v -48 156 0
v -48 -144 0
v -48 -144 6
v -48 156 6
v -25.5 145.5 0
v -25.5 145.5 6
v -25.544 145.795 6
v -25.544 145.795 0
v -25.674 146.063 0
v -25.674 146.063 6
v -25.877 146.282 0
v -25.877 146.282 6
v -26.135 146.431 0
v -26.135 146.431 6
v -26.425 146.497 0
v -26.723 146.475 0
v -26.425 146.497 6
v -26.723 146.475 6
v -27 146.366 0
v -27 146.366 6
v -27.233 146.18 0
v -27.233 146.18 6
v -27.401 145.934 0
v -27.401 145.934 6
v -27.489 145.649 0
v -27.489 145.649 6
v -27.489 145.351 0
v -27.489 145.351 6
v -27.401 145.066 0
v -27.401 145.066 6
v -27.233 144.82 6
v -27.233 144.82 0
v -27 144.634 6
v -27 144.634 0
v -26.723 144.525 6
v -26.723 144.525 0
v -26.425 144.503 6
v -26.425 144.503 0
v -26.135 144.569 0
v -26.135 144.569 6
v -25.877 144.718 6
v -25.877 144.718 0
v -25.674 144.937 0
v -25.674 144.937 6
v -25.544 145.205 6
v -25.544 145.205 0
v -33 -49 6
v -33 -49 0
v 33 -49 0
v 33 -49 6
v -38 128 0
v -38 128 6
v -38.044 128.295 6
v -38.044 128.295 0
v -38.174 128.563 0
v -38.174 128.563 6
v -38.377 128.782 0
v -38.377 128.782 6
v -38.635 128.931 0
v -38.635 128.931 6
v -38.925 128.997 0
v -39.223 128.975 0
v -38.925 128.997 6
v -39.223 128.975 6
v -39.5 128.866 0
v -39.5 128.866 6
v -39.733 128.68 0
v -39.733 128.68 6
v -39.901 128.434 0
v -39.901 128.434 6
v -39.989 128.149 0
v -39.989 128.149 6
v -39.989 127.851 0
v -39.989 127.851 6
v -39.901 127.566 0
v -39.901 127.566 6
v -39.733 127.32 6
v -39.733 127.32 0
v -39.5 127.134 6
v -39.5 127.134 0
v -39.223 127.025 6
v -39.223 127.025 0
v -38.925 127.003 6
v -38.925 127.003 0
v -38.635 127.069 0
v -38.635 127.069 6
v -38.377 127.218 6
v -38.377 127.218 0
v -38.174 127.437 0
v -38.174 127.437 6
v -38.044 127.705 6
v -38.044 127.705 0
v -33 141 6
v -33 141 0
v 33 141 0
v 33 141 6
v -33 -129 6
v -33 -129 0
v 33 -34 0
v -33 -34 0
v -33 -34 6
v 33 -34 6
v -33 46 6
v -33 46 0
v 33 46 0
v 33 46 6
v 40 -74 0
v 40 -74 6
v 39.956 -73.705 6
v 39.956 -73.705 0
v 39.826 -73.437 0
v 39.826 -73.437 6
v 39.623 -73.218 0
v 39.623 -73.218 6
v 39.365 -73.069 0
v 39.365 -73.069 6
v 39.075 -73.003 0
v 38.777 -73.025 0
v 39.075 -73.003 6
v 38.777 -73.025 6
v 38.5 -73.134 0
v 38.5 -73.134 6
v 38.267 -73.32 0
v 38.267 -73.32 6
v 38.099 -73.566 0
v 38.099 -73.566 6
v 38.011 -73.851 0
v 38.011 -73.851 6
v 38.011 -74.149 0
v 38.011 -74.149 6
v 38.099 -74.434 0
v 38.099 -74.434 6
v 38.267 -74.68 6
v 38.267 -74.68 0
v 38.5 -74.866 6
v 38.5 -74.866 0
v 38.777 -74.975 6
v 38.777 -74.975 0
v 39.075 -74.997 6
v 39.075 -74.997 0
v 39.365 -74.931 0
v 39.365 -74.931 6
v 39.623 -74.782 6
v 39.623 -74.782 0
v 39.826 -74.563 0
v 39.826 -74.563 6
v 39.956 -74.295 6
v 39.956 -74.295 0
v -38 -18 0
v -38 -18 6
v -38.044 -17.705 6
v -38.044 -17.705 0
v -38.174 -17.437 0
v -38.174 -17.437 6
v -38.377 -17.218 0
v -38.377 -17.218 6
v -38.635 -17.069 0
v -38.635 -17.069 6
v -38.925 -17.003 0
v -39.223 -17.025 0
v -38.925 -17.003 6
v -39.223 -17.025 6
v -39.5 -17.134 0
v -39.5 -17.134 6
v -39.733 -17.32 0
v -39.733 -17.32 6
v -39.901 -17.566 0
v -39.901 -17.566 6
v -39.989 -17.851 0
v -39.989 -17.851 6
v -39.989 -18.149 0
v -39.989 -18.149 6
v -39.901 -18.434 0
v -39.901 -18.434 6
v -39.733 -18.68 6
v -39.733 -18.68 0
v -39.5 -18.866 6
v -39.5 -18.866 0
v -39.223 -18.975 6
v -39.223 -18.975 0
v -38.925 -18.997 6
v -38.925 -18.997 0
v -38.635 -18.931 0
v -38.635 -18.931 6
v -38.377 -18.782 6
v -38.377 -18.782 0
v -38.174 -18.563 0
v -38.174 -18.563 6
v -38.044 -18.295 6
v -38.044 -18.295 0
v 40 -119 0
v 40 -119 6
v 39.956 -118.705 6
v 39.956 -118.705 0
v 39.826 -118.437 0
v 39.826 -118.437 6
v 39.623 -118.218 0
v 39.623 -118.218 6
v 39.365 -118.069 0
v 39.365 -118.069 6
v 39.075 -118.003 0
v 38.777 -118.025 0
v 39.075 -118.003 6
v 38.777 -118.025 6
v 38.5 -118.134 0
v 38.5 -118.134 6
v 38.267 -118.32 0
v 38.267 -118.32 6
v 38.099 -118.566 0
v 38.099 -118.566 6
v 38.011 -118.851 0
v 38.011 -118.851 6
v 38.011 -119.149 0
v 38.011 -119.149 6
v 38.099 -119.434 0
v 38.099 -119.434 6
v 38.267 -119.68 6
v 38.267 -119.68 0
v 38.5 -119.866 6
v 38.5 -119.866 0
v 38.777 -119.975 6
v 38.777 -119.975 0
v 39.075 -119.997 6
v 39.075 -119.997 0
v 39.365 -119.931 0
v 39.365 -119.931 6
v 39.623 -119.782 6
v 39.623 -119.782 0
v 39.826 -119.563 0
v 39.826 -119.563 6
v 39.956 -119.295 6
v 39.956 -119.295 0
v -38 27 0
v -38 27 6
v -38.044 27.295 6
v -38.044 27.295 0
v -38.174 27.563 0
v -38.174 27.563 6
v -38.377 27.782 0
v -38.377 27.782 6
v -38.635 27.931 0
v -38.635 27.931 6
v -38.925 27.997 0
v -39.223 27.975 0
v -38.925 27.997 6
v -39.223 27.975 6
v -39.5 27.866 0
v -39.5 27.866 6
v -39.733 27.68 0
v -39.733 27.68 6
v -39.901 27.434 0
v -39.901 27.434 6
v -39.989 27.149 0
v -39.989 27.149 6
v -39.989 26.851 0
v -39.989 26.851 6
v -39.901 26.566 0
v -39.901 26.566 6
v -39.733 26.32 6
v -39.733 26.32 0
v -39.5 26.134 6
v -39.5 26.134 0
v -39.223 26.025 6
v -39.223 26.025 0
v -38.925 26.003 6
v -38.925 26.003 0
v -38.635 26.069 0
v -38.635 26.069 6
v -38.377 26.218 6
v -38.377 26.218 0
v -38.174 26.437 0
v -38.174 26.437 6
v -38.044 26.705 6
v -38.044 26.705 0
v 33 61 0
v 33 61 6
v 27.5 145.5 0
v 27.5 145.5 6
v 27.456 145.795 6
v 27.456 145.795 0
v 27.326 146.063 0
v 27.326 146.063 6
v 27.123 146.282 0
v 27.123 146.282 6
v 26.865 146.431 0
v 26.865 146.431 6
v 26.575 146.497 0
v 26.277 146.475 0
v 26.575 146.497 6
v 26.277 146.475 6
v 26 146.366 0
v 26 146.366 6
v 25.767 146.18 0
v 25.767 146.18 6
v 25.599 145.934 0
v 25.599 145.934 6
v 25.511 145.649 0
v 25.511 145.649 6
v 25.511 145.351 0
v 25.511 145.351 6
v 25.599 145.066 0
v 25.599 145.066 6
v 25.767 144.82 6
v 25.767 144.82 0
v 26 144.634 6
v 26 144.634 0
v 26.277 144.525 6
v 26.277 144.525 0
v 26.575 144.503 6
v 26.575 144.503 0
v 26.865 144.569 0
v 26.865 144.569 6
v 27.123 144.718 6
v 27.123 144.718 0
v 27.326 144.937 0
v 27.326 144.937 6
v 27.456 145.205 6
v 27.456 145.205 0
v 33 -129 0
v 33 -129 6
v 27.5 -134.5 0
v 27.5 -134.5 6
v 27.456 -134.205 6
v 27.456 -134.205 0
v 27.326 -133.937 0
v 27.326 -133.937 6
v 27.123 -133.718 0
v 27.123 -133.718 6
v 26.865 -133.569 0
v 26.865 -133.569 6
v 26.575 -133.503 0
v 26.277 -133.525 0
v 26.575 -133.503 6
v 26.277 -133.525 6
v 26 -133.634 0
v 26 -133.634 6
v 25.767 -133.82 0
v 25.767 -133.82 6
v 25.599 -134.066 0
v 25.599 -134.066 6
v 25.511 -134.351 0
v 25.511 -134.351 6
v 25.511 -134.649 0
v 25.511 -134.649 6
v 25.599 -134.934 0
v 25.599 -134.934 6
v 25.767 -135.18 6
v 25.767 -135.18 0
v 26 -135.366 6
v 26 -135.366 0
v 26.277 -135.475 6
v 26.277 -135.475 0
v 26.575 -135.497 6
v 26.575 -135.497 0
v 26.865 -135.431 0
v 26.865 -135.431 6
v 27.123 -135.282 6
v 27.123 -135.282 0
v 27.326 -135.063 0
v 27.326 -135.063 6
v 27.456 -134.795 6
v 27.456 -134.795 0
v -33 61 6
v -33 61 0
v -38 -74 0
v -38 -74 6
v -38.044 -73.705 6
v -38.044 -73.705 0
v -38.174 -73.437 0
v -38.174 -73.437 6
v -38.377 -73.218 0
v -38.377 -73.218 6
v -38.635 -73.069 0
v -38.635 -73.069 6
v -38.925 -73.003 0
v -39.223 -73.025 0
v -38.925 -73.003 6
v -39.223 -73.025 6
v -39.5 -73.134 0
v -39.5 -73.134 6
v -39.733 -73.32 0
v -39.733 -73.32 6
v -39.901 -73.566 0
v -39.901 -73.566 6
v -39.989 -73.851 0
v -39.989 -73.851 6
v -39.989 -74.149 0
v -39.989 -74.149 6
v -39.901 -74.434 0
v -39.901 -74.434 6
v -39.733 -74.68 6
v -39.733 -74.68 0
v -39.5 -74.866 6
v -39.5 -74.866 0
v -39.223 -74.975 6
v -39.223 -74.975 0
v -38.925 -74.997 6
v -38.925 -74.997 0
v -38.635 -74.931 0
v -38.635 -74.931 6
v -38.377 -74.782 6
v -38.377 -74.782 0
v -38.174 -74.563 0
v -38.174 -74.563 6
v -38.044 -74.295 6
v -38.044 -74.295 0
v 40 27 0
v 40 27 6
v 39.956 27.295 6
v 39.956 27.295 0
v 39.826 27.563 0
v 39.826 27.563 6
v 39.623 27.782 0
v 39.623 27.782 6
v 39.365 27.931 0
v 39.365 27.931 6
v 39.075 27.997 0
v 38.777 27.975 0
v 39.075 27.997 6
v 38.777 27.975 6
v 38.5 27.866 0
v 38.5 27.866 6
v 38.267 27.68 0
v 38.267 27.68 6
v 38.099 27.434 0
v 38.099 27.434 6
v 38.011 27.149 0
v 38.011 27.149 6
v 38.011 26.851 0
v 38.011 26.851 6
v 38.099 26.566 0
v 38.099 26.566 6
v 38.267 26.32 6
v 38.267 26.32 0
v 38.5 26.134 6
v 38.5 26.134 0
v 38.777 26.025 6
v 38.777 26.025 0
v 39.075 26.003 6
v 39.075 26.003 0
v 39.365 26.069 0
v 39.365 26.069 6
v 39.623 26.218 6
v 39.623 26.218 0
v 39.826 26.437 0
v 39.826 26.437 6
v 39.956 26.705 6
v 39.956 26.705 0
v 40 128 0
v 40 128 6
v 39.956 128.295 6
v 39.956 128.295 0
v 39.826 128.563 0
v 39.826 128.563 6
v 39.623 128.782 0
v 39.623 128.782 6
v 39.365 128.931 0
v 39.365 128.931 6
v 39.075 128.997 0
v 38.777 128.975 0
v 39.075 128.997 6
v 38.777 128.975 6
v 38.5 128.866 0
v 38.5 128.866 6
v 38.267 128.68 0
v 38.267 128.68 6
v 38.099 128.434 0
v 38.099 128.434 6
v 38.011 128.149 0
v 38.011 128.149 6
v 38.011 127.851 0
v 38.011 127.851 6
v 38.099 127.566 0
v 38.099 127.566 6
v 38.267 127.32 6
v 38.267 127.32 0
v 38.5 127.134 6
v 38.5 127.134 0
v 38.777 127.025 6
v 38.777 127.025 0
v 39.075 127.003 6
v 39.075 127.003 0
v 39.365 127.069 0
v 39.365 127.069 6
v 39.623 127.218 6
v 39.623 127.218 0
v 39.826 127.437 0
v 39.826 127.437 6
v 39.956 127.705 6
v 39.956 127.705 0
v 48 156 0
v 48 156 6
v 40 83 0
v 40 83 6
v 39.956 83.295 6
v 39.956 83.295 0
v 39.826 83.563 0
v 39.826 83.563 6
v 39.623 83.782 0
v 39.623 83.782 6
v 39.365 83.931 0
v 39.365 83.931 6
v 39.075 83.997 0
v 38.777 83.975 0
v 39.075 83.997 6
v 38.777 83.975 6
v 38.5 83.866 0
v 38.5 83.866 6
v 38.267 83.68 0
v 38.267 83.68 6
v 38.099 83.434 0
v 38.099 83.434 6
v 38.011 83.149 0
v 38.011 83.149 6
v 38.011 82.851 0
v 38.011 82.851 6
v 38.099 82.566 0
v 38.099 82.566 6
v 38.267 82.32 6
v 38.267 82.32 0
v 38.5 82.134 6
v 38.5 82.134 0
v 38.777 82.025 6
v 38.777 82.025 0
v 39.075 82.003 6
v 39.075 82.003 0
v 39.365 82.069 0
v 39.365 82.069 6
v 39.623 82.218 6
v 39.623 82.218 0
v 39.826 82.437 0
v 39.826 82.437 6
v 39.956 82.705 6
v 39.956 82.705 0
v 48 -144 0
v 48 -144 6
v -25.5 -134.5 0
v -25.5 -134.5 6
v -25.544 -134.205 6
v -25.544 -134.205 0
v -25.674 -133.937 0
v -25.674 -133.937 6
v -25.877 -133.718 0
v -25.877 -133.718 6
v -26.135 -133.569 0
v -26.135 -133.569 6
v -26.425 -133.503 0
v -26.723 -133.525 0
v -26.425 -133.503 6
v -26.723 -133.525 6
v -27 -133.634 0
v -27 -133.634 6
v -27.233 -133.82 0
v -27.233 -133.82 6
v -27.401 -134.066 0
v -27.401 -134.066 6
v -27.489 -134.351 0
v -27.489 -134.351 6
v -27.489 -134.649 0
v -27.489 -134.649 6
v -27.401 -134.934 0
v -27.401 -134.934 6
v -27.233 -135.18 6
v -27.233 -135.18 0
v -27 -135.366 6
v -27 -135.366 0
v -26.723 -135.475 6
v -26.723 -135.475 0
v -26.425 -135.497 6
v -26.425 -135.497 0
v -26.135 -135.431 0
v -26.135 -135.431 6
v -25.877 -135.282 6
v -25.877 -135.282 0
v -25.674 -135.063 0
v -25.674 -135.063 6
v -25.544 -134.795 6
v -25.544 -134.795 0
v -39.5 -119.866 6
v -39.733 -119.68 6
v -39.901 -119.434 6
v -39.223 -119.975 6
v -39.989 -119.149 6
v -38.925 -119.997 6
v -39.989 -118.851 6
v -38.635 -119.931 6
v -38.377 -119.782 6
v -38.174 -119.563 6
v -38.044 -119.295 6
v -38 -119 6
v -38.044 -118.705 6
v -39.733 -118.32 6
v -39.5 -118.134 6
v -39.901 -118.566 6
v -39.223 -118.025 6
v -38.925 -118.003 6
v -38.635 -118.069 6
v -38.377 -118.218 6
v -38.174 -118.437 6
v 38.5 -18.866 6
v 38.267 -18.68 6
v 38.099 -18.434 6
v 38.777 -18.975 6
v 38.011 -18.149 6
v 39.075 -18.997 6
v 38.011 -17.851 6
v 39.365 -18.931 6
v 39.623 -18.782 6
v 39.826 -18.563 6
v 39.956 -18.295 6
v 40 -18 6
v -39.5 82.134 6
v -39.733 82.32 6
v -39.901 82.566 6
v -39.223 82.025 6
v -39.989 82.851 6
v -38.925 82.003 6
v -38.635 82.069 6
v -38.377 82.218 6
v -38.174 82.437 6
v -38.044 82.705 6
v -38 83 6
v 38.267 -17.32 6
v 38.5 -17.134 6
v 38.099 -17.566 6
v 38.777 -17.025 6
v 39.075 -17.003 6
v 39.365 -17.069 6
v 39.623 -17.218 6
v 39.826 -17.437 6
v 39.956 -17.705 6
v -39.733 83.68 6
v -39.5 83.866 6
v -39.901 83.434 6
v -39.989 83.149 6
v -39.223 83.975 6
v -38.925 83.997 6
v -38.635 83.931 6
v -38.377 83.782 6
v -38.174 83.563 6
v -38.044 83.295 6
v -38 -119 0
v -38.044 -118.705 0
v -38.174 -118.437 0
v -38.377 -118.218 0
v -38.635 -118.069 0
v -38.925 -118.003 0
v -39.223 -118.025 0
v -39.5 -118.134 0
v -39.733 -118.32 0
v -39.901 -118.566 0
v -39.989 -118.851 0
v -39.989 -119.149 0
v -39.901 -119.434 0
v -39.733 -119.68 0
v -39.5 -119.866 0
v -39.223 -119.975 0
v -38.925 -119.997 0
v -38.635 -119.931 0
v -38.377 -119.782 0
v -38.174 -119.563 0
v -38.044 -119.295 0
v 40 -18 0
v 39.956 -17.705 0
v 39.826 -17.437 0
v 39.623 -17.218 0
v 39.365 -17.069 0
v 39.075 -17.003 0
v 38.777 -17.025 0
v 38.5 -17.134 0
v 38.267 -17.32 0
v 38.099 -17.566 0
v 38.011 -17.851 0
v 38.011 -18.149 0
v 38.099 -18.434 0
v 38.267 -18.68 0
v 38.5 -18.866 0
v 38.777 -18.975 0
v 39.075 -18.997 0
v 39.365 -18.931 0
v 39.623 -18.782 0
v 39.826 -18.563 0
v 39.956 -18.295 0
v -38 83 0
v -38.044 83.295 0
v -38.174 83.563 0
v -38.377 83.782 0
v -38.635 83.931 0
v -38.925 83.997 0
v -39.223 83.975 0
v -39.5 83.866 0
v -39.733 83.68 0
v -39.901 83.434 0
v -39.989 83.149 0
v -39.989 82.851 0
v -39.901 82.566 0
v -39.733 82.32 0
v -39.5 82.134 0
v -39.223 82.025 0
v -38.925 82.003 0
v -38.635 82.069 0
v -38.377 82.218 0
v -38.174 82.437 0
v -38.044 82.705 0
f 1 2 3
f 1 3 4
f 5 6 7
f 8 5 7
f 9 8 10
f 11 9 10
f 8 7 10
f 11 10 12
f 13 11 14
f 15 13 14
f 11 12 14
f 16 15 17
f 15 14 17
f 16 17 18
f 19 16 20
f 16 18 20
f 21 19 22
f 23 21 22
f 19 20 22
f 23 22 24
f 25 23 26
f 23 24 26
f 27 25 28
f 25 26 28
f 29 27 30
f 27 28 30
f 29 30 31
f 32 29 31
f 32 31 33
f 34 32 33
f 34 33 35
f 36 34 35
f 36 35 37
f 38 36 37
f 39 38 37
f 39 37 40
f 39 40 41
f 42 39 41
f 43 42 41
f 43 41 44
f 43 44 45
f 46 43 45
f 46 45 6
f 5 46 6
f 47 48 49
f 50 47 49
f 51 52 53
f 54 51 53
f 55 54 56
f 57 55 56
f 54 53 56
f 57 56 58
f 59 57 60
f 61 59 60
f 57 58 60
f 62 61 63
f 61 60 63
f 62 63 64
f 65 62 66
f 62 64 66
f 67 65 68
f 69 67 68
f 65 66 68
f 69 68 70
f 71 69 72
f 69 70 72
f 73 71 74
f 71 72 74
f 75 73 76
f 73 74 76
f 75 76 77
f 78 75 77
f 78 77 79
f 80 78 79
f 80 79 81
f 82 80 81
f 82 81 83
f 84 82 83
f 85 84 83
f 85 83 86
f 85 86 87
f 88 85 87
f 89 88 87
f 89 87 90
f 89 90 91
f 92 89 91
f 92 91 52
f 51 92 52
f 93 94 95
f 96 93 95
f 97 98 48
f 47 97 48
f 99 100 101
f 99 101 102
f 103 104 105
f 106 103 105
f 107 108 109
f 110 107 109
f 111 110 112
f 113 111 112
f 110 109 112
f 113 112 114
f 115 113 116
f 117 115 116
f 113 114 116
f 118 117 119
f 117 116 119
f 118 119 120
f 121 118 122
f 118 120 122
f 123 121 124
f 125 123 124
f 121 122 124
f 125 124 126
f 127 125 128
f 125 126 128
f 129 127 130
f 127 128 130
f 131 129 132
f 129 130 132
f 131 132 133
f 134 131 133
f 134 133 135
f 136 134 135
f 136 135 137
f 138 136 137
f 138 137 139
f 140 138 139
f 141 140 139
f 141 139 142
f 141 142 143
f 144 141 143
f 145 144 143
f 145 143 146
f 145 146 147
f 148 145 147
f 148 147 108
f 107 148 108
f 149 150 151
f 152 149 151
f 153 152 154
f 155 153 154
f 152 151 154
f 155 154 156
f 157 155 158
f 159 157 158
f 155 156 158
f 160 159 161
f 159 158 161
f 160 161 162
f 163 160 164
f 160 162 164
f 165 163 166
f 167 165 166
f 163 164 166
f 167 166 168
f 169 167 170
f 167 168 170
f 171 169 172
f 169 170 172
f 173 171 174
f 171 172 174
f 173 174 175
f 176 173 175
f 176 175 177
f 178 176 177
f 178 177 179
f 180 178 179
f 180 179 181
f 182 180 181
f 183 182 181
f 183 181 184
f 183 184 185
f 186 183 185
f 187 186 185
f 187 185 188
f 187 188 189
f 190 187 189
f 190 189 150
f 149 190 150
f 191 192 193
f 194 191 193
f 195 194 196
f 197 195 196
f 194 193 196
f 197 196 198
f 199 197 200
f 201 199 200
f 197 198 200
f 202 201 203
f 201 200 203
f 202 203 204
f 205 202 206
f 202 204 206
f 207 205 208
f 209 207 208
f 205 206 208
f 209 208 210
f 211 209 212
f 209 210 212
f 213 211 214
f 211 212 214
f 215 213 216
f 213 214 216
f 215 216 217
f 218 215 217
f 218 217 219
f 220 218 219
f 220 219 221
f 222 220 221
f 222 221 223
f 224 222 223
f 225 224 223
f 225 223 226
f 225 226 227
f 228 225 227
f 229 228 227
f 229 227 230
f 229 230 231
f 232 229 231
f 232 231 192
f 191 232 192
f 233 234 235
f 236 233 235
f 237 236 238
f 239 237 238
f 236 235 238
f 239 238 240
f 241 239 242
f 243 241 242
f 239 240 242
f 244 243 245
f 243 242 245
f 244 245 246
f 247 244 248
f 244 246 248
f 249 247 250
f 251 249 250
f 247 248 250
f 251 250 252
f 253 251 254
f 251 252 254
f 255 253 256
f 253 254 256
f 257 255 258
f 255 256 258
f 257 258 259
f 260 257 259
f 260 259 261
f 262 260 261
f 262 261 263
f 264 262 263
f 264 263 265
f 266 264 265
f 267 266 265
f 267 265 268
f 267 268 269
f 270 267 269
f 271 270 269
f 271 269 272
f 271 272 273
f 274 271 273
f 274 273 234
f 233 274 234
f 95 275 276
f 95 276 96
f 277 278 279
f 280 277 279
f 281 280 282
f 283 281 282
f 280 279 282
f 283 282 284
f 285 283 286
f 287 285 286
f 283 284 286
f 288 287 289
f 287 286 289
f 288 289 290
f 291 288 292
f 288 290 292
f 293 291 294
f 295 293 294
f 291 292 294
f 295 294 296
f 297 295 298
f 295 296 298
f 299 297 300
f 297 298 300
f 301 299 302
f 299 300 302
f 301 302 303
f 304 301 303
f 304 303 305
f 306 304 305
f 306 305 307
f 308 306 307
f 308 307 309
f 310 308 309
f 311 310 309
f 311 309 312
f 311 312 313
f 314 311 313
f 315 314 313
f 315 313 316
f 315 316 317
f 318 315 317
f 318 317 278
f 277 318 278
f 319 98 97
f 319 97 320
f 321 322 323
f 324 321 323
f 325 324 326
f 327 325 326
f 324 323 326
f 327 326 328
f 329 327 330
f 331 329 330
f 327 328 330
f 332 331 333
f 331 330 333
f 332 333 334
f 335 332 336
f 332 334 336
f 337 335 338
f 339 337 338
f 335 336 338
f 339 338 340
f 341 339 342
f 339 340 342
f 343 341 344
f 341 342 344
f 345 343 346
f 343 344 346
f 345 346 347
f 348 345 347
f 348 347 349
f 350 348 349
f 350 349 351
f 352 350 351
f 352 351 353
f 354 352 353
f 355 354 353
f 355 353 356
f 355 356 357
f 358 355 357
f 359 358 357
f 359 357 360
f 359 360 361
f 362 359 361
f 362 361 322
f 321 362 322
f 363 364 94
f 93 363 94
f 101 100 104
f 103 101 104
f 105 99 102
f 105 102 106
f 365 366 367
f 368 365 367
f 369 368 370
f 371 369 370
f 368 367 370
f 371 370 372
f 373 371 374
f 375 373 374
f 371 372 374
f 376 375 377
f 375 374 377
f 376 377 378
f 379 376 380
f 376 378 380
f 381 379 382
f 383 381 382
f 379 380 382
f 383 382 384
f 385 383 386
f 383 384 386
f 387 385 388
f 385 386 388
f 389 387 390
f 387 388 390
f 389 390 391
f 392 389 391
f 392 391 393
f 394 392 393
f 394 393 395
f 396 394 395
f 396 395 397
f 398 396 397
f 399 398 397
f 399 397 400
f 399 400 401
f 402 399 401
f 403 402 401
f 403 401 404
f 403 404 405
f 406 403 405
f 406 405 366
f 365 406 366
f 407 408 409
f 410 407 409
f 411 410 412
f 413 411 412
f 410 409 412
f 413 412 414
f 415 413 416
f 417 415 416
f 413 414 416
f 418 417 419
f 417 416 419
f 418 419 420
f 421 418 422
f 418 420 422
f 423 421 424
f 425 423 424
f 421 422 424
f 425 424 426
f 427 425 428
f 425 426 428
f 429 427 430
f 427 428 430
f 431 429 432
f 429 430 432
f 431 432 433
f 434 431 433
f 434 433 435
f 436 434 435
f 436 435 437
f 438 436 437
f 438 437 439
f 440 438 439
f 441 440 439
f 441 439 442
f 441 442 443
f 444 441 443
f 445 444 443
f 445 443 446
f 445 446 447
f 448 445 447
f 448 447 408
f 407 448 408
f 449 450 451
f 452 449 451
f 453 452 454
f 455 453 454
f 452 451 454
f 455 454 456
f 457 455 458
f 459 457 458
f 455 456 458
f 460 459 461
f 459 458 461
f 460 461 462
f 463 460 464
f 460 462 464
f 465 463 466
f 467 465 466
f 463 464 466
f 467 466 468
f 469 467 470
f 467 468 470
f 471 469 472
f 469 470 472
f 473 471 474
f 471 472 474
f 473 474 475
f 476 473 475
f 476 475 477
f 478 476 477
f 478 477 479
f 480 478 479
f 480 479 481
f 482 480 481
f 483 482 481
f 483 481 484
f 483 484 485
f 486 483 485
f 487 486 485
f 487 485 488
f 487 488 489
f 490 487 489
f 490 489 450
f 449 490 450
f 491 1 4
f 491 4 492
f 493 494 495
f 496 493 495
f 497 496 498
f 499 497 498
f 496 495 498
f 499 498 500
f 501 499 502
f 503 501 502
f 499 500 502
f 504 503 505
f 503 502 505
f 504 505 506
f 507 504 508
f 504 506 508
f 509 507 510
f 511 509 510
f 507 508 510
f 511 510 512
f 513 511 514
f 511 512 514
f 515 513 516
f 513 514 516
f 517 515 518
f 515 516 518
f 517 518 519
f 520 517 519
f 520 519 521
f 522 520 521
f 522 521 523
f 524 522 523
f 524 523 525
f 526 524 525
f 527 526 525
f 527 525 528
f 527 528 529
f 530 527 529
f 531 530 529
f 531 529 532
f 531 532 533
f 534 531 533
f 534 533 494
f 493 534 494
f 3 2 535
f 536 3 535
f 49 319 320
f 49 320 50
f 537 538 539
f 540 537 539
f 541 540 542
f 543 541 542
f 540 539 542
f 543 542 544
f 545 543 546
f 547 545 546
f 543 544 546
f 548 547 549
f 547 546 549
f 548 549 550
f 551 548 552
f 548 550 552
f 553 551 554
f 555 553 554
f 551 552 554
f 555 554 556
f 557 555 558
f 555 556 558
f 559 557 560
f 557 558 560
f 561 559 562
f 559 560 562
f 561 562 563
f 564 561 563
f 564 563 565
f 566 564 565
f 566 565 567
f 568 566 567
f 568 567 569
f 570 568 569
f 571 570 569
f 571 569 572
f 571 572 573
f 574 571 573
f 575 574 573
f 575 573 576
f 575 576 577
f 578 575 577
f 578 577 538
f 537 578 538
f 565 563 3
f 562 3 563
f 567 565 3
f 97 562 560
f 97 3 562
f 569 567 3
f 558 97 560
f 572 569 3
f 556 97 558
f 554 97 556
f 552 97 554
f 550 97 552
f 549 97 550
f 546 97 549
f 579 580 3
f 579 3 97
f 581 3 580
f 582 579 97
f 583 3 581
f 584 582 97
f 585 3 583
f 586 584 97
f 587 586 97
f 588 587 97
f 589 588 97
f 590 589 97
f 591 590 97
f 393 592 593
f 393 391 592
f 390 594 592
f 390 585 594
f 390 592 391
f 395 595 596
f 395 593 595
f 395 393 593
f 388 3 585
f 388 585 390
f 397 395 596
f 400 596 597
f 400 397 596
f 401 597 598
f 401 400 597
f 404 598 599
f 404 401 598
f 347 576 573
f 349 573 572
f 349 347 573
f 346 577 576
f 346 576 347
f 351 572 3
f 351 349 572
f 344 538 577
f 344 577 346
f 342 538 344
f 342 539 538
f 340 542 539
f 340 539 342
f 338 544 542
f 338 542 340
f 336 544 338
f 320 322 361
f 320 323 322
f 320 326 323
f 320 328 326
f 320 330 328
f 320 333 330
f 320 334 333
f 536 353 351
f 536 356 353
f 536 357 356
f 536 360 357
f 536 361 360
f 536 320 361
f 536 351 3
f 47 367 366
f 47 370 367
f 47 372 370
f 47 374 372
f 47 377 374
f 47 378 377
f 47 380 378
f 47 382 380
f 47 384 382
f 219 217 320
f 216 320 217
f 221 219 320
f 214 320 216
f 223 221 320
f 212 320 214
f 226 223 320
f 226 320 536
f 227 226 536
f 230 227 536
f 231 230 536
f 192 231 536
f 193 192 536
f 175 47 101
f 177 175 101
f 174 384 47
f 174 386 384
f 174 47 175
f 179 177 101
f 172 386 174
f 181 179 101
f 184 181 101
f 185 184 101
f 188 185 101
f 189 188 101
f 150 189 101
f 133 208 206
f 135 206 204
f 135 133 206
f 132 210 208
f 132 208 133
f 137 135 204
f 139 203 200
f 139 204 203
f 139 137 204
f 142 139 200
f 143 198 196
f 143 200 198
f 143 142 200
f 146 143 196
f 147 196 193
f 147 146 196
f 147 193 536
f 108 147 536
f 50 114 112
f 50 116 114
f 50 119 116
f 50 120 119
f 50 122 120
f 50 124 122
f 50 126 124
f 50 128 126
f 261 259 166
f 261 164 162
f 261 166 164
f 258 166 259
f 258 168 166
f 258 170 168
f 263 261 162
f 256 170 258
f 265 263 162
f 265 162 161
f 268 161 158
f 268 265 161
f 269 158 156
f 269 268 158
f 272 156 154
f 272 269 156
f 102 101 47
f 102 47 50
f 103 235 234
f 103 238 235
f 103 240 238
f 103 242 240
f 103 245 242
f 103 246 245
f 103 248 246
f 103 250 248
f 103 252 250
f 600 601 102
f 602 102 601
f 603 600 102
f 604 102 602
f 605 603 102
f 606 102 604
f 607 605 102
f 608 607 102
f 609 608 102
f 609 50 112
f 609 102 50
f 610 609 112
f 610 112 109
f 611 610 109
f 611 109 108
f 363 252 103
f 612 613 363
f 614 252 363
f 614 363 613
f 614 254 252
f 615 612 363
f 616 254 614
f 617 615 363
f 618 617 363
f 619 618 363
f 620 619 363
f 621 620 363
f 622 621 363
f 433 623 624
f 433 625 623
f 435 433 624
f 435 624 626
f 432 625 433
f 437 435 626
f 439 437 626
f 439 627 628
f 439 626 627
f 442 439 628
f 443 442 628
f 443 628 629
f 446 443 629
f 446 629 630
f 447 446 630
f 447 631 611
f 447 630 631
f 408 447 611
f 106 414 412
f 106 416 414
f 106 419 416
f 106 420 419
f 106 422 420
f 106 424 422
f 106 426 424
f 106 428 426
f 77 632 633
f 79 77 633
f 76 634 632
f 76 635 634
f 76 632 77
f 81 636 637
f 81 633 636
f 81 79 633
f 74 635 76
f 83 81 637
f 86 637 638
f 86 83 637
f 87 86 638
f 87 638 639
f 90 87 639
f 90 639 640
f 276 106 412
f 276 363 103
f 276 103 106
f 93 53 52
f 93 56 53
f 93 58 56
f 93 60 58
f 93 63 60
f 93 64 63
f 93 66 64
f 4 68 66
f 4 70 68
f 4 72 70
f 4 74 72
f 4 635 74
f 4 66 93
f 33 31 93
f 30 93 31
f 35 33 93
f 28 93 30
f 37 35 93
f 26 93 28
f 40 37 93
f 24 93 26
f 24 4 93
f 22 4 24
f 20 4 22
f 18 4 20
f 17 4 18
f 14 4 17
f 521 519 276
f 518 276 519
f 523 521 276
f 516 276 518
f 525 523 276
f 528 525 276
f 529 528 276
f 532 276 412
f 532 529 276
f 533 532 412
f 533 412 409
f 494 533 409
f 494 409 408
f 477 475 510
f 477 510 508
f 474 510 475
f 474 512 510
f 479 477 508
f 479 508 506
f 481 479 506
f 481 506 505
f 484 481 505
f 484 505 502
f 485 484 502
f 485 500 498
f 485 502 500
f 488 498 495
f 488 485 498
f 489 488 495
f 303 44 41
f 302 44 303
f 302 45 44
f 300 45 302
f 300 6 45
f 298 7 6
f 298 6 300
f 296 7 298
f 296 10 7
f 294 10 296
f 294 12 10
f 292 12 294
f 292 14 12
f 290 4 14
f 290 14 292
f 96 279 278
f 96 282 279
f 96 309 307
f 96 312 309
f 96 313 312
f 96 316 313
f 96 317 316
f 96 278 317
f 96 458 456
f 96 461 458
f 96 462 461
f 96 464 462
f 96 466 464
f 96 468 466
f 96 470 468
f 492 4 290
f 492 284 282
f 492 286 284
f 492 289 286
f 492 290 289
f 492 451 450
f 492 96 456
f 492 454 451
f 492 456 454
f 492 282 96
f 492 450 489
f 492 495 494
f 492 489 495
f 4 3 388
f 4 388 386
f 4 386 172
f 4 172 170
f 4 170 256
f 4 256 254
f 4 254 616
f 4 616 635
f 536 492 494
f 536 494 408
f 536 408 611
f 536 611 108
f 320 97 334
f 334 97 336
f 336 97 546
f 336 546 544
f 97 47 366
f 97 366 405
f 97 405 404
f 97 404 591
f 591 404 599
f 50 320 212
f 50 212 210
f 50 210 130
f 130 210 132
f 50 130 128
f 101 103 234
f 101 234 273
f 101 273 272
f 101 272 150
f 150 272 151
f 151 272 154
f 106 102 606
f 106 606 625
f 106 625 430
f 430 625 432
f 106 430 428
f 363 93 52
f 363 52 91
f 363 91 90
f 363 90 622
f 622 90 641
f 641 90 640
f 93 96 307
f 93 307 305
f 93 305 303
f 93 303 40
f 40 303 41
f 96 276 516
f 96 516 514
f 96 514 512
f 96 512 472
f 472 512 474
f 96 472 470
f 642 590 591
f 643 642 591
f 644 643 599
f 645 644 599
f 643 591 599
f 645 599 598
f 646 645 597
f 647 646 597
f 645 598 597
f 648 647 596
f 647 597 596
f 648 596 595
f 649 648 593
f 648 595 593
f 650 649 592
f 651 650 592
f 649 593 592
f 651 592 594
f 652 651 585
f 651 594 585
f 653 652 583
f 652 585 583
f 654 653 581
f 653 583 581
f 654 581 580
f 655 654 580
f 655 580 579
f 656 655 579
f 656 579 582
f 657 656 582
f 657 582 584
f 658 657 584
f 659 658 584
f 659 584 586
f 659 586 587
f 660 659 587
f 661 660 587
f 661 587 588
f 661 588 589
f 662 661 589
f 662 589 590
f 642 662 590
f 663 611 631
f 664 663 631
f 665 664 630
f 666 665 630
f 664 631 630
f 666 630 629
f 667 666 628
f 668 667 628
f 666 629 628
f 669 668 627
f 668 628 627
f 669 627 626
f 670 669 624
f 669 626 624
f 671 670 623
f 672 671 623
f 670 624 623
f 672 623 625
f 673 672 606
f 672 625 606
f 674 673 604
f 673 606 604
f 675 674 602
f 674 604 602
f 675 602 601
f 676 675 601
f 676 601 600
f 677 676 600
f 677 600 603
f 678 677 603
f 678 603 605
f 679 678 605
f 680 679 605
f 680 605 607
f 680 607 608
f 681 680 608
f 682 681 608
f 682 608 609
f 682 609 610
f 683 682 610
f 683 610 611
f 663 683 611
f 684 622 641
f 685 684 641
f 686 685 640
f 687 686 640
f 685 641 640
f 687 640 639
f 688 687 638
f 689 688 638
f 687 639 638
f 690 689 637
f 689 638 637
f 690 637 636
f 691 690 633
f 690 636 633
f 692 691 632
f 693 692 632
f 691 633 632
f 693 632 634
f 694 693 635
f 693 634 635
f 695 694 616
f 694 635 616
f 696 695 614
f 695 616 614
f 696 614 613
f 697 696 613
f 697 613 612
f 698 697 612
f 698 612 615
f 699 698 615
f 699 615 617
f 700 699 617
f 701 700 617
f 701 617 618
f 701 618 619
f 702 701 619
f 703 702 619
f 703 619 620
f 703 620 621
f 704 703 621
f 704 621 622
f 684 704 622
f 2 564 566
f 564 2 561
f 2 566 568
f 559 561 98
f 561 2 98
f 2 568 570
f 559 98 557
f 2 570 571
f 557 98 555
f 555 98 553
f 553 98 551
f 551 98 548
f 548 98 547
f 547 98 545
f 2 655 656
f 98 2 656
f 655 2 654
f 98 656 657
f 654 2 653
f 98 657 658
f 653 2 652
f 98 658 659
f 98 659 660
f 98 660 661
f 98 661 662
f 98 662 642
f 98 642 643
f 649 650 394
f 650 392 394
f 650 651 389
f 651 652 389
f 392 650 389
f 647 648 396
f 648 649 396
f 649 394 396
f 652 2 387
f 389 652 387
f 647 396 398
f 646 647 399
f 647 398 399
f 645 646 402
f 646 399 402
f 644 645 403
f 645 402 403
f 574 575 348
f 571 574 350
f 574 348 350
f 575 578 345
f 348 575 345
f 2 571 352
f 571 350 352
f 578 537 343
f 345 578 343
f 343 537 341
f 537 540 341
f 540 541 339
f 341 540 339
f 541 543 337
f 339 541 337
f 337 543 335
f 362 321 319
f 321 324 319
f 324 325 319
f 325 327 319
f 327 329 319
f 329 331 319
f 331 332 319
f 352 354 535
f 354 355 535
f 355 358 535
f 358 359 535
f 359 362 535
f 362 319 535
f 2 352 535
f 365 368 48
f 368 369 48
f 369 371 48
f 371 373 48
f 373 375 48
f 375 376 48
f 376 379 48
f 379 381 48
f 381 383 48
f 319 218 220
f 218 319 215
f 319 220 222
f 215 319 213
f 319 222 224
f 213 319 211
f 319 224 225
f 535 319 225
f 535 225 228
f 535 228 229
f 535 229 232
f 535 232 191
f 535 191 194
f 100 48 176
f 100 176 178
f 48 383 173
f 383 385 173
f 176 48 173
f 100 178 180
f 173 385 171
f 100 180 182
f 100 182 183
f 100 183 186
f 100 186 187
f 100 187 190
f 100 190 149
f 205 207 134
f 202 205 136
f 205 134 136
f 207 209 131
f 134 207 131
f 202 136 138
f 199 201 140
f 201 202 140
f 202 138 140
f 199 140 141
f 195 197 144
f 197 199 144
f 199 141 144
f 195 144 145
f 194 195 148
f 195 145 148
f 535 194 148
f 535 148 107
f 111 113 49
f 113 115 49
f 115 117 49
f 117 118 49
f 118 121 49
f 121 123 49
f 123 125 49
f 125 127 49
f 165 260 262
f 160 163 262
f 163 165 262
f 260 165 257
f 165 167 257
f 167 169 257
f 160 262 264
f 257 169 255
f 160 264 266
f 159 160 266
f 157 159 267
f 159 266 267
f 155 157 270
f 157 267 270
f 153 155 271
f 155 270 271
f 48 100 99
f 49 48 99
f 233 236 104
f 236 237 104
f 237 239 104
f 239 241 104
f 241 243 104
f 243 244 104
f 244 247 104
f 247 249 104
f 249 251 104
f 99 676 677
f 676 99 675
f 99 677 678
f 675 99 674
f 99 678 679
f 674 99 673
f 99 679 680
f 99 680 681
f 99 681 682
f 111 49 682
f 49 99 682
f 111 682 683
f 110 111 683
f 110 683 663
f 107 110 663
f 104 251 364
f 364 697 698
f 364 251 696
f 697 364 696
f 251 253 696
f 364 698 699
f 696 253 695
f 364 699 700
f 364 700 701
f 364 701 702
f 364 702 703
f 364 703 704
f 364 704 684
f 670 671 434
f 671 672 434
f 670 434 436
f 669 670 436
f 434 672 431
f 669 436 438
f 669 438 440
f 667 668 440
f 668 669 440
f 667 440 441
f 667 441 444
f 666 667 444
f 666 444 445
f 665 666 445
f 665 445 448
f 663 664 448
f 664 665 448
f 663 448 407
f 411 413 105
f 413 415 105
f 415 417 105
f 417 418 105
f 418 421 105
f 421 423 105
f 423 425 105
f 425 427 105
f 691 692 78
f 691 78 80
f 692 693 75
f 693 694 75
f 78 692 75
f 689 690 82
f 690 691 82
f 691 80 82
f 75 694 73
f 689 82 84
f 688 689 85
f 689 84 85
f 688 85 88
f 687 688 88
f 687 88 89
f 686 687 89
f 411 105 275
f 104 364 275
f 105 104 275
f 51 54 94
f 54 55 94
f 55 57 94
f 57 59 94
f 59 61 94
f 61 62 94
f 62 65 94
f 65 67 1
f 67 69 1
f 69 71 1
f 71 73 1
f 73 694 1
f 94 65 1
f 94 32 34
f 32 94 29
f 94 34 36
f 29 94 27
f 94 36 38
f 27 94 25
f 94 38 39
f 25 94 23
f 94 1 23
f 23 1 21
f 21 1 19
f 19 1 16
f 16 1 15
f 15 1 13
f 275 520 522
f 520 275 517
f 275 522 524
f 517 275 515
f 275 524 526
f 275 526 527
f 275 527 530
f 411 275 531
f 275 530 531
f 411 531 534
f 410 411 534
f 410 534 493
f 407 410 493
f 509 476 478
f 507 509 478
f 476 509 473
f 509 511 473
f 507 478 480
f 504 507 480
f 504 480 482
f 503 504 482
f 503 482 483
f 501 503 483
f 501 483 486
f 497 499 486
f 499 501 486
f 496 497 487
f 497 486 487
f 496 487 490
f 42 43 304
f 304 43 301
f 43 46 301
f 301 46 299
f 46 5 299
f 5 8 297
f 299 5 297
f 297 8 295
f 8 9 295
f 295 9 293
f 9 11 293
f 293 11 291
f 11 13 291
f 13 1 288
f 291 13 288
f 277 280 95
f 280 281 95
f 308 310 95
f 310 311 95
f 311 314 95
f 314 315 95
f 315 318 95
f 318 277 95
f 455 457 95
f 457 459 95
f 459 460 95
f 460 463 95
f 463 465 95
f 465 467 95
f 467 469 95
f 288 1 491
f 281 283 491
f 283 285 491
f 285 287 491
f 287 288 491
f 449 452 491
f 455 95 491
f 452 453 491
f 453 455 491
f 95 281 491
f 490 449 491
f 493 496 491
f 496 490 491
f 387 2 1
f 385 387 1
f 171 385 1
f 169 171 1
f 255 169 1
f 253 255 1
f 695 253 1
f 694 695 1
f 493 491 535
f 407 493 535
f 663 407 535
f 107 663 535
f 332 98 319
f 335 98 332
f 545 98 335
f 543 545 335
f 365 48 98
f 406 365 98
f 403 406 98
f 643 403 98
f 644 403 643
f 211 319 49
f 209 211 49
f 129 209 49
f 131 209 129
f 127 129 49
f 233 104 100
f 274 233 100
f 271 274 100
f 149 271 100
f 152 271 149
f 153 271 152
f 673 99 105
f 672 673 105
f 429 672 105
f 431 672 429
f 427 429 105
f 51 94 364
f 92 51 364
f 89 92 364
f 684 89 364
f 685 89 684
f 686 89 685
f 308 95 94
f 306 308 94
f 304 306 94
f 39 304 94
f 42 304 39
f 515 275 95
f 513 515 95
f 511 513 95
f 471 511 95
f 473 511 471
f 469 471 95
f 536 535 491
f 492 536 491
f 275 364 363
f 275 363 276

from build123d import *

# Parameters (mm, degrees)
SKETCH1_W           = 96
SKETCH1_H           = 300
SKETCH1_W_2         = 66
SKETCH1_H_2         = 80
BOSS_EXTRUDE1_DEPTH = 6
SKETCH3_R           = 1
CUT_EXTRUDE6_DEPTH  = 10
SKETCH5_R           = 1
CUT_EXTRUDE9_DEPTH  = 10


with BuildPart() as part:
    # Sketch1 → Boss-Extrude1 (new body)
    with BuildSketch(Plane.XY):
        with Locations((0, 6)):
            Rectangle(SKETCH1_W, SKETCH1_H)
        with Locations((0, 101)):
            Rectangle(SKETCH1_W_2, SKETCH1_H_2, mode=Mode.SUBTRACT)
        with Locations((0, -89)):
            Rectangle(SKETCH1_W_2, SKETCH1_H_2, mode=Mode.SUBTRACT)
        with Locations((0, 6)):
            Rectangle(SKETCH1_W_2, SKETCH1_H_2, mode=Mode.SUBTRACT)
    extrude(amount=BOSS_EXTRUDE1_DEPTH)

    # Sketch3 → Cut-Extrude6 (cut)
    with BuildSketch(Plane.XY.offset(6)):
        with Locations((-39, 128)):
            Circle(SKETCH3_R)
        with Locations((-39, 27)):
            Circle(SKETCH3_R)
        with Locations((39, 128)):
            Circle(SKETCH3_R)
        with Locations((39, 83)):
            Circle(SKETCH3_R)
        with Locations((-39, 83)):
            Circle(SKETCH3_R)
        with Locations((39, 27)):
            Circle(SKETCH3_R)
        with Locations((39, -18)):
            Circle(SKETCH3_R)
        with Locations((-39, -18)):
            Circle(SKETCH3_R)
        with Locations((-39, -74)):
            Circle(SKETCH3_R)
        with Locations((39, -74)):
            Circle(SKETCH3_R)
        with Locations((39, -119)):
            Circle(SKETCH3_R)
        with Locations((-39, -119)):
            Circle(SKETCH3_R)
    extrude(amount=-CUT_EXTRUDE6_DEPTH, mode=Mode.SUBTRACT)

    # Sketch5 → Cut-Extrude9 (cut)
    with BuildSketch(Plane.XY.offset(6)):
        with Locations((-26.5, -134.5)):
            Circle(SKETCH5_R)
        with Locations((26.5, -134.5)):
            Circle(SKETCH5_R)
        with Locations((-26.5, 145.5)):
            Circle(SKETCH5_R)
        with Locations((26.5, 145.5)):
            Circle(SKETCH5_R)
    extrude(amount=-CUT_EXTRUDE9_DEPTH, mode=Mode.SUBTRACT)


solid = part.part
